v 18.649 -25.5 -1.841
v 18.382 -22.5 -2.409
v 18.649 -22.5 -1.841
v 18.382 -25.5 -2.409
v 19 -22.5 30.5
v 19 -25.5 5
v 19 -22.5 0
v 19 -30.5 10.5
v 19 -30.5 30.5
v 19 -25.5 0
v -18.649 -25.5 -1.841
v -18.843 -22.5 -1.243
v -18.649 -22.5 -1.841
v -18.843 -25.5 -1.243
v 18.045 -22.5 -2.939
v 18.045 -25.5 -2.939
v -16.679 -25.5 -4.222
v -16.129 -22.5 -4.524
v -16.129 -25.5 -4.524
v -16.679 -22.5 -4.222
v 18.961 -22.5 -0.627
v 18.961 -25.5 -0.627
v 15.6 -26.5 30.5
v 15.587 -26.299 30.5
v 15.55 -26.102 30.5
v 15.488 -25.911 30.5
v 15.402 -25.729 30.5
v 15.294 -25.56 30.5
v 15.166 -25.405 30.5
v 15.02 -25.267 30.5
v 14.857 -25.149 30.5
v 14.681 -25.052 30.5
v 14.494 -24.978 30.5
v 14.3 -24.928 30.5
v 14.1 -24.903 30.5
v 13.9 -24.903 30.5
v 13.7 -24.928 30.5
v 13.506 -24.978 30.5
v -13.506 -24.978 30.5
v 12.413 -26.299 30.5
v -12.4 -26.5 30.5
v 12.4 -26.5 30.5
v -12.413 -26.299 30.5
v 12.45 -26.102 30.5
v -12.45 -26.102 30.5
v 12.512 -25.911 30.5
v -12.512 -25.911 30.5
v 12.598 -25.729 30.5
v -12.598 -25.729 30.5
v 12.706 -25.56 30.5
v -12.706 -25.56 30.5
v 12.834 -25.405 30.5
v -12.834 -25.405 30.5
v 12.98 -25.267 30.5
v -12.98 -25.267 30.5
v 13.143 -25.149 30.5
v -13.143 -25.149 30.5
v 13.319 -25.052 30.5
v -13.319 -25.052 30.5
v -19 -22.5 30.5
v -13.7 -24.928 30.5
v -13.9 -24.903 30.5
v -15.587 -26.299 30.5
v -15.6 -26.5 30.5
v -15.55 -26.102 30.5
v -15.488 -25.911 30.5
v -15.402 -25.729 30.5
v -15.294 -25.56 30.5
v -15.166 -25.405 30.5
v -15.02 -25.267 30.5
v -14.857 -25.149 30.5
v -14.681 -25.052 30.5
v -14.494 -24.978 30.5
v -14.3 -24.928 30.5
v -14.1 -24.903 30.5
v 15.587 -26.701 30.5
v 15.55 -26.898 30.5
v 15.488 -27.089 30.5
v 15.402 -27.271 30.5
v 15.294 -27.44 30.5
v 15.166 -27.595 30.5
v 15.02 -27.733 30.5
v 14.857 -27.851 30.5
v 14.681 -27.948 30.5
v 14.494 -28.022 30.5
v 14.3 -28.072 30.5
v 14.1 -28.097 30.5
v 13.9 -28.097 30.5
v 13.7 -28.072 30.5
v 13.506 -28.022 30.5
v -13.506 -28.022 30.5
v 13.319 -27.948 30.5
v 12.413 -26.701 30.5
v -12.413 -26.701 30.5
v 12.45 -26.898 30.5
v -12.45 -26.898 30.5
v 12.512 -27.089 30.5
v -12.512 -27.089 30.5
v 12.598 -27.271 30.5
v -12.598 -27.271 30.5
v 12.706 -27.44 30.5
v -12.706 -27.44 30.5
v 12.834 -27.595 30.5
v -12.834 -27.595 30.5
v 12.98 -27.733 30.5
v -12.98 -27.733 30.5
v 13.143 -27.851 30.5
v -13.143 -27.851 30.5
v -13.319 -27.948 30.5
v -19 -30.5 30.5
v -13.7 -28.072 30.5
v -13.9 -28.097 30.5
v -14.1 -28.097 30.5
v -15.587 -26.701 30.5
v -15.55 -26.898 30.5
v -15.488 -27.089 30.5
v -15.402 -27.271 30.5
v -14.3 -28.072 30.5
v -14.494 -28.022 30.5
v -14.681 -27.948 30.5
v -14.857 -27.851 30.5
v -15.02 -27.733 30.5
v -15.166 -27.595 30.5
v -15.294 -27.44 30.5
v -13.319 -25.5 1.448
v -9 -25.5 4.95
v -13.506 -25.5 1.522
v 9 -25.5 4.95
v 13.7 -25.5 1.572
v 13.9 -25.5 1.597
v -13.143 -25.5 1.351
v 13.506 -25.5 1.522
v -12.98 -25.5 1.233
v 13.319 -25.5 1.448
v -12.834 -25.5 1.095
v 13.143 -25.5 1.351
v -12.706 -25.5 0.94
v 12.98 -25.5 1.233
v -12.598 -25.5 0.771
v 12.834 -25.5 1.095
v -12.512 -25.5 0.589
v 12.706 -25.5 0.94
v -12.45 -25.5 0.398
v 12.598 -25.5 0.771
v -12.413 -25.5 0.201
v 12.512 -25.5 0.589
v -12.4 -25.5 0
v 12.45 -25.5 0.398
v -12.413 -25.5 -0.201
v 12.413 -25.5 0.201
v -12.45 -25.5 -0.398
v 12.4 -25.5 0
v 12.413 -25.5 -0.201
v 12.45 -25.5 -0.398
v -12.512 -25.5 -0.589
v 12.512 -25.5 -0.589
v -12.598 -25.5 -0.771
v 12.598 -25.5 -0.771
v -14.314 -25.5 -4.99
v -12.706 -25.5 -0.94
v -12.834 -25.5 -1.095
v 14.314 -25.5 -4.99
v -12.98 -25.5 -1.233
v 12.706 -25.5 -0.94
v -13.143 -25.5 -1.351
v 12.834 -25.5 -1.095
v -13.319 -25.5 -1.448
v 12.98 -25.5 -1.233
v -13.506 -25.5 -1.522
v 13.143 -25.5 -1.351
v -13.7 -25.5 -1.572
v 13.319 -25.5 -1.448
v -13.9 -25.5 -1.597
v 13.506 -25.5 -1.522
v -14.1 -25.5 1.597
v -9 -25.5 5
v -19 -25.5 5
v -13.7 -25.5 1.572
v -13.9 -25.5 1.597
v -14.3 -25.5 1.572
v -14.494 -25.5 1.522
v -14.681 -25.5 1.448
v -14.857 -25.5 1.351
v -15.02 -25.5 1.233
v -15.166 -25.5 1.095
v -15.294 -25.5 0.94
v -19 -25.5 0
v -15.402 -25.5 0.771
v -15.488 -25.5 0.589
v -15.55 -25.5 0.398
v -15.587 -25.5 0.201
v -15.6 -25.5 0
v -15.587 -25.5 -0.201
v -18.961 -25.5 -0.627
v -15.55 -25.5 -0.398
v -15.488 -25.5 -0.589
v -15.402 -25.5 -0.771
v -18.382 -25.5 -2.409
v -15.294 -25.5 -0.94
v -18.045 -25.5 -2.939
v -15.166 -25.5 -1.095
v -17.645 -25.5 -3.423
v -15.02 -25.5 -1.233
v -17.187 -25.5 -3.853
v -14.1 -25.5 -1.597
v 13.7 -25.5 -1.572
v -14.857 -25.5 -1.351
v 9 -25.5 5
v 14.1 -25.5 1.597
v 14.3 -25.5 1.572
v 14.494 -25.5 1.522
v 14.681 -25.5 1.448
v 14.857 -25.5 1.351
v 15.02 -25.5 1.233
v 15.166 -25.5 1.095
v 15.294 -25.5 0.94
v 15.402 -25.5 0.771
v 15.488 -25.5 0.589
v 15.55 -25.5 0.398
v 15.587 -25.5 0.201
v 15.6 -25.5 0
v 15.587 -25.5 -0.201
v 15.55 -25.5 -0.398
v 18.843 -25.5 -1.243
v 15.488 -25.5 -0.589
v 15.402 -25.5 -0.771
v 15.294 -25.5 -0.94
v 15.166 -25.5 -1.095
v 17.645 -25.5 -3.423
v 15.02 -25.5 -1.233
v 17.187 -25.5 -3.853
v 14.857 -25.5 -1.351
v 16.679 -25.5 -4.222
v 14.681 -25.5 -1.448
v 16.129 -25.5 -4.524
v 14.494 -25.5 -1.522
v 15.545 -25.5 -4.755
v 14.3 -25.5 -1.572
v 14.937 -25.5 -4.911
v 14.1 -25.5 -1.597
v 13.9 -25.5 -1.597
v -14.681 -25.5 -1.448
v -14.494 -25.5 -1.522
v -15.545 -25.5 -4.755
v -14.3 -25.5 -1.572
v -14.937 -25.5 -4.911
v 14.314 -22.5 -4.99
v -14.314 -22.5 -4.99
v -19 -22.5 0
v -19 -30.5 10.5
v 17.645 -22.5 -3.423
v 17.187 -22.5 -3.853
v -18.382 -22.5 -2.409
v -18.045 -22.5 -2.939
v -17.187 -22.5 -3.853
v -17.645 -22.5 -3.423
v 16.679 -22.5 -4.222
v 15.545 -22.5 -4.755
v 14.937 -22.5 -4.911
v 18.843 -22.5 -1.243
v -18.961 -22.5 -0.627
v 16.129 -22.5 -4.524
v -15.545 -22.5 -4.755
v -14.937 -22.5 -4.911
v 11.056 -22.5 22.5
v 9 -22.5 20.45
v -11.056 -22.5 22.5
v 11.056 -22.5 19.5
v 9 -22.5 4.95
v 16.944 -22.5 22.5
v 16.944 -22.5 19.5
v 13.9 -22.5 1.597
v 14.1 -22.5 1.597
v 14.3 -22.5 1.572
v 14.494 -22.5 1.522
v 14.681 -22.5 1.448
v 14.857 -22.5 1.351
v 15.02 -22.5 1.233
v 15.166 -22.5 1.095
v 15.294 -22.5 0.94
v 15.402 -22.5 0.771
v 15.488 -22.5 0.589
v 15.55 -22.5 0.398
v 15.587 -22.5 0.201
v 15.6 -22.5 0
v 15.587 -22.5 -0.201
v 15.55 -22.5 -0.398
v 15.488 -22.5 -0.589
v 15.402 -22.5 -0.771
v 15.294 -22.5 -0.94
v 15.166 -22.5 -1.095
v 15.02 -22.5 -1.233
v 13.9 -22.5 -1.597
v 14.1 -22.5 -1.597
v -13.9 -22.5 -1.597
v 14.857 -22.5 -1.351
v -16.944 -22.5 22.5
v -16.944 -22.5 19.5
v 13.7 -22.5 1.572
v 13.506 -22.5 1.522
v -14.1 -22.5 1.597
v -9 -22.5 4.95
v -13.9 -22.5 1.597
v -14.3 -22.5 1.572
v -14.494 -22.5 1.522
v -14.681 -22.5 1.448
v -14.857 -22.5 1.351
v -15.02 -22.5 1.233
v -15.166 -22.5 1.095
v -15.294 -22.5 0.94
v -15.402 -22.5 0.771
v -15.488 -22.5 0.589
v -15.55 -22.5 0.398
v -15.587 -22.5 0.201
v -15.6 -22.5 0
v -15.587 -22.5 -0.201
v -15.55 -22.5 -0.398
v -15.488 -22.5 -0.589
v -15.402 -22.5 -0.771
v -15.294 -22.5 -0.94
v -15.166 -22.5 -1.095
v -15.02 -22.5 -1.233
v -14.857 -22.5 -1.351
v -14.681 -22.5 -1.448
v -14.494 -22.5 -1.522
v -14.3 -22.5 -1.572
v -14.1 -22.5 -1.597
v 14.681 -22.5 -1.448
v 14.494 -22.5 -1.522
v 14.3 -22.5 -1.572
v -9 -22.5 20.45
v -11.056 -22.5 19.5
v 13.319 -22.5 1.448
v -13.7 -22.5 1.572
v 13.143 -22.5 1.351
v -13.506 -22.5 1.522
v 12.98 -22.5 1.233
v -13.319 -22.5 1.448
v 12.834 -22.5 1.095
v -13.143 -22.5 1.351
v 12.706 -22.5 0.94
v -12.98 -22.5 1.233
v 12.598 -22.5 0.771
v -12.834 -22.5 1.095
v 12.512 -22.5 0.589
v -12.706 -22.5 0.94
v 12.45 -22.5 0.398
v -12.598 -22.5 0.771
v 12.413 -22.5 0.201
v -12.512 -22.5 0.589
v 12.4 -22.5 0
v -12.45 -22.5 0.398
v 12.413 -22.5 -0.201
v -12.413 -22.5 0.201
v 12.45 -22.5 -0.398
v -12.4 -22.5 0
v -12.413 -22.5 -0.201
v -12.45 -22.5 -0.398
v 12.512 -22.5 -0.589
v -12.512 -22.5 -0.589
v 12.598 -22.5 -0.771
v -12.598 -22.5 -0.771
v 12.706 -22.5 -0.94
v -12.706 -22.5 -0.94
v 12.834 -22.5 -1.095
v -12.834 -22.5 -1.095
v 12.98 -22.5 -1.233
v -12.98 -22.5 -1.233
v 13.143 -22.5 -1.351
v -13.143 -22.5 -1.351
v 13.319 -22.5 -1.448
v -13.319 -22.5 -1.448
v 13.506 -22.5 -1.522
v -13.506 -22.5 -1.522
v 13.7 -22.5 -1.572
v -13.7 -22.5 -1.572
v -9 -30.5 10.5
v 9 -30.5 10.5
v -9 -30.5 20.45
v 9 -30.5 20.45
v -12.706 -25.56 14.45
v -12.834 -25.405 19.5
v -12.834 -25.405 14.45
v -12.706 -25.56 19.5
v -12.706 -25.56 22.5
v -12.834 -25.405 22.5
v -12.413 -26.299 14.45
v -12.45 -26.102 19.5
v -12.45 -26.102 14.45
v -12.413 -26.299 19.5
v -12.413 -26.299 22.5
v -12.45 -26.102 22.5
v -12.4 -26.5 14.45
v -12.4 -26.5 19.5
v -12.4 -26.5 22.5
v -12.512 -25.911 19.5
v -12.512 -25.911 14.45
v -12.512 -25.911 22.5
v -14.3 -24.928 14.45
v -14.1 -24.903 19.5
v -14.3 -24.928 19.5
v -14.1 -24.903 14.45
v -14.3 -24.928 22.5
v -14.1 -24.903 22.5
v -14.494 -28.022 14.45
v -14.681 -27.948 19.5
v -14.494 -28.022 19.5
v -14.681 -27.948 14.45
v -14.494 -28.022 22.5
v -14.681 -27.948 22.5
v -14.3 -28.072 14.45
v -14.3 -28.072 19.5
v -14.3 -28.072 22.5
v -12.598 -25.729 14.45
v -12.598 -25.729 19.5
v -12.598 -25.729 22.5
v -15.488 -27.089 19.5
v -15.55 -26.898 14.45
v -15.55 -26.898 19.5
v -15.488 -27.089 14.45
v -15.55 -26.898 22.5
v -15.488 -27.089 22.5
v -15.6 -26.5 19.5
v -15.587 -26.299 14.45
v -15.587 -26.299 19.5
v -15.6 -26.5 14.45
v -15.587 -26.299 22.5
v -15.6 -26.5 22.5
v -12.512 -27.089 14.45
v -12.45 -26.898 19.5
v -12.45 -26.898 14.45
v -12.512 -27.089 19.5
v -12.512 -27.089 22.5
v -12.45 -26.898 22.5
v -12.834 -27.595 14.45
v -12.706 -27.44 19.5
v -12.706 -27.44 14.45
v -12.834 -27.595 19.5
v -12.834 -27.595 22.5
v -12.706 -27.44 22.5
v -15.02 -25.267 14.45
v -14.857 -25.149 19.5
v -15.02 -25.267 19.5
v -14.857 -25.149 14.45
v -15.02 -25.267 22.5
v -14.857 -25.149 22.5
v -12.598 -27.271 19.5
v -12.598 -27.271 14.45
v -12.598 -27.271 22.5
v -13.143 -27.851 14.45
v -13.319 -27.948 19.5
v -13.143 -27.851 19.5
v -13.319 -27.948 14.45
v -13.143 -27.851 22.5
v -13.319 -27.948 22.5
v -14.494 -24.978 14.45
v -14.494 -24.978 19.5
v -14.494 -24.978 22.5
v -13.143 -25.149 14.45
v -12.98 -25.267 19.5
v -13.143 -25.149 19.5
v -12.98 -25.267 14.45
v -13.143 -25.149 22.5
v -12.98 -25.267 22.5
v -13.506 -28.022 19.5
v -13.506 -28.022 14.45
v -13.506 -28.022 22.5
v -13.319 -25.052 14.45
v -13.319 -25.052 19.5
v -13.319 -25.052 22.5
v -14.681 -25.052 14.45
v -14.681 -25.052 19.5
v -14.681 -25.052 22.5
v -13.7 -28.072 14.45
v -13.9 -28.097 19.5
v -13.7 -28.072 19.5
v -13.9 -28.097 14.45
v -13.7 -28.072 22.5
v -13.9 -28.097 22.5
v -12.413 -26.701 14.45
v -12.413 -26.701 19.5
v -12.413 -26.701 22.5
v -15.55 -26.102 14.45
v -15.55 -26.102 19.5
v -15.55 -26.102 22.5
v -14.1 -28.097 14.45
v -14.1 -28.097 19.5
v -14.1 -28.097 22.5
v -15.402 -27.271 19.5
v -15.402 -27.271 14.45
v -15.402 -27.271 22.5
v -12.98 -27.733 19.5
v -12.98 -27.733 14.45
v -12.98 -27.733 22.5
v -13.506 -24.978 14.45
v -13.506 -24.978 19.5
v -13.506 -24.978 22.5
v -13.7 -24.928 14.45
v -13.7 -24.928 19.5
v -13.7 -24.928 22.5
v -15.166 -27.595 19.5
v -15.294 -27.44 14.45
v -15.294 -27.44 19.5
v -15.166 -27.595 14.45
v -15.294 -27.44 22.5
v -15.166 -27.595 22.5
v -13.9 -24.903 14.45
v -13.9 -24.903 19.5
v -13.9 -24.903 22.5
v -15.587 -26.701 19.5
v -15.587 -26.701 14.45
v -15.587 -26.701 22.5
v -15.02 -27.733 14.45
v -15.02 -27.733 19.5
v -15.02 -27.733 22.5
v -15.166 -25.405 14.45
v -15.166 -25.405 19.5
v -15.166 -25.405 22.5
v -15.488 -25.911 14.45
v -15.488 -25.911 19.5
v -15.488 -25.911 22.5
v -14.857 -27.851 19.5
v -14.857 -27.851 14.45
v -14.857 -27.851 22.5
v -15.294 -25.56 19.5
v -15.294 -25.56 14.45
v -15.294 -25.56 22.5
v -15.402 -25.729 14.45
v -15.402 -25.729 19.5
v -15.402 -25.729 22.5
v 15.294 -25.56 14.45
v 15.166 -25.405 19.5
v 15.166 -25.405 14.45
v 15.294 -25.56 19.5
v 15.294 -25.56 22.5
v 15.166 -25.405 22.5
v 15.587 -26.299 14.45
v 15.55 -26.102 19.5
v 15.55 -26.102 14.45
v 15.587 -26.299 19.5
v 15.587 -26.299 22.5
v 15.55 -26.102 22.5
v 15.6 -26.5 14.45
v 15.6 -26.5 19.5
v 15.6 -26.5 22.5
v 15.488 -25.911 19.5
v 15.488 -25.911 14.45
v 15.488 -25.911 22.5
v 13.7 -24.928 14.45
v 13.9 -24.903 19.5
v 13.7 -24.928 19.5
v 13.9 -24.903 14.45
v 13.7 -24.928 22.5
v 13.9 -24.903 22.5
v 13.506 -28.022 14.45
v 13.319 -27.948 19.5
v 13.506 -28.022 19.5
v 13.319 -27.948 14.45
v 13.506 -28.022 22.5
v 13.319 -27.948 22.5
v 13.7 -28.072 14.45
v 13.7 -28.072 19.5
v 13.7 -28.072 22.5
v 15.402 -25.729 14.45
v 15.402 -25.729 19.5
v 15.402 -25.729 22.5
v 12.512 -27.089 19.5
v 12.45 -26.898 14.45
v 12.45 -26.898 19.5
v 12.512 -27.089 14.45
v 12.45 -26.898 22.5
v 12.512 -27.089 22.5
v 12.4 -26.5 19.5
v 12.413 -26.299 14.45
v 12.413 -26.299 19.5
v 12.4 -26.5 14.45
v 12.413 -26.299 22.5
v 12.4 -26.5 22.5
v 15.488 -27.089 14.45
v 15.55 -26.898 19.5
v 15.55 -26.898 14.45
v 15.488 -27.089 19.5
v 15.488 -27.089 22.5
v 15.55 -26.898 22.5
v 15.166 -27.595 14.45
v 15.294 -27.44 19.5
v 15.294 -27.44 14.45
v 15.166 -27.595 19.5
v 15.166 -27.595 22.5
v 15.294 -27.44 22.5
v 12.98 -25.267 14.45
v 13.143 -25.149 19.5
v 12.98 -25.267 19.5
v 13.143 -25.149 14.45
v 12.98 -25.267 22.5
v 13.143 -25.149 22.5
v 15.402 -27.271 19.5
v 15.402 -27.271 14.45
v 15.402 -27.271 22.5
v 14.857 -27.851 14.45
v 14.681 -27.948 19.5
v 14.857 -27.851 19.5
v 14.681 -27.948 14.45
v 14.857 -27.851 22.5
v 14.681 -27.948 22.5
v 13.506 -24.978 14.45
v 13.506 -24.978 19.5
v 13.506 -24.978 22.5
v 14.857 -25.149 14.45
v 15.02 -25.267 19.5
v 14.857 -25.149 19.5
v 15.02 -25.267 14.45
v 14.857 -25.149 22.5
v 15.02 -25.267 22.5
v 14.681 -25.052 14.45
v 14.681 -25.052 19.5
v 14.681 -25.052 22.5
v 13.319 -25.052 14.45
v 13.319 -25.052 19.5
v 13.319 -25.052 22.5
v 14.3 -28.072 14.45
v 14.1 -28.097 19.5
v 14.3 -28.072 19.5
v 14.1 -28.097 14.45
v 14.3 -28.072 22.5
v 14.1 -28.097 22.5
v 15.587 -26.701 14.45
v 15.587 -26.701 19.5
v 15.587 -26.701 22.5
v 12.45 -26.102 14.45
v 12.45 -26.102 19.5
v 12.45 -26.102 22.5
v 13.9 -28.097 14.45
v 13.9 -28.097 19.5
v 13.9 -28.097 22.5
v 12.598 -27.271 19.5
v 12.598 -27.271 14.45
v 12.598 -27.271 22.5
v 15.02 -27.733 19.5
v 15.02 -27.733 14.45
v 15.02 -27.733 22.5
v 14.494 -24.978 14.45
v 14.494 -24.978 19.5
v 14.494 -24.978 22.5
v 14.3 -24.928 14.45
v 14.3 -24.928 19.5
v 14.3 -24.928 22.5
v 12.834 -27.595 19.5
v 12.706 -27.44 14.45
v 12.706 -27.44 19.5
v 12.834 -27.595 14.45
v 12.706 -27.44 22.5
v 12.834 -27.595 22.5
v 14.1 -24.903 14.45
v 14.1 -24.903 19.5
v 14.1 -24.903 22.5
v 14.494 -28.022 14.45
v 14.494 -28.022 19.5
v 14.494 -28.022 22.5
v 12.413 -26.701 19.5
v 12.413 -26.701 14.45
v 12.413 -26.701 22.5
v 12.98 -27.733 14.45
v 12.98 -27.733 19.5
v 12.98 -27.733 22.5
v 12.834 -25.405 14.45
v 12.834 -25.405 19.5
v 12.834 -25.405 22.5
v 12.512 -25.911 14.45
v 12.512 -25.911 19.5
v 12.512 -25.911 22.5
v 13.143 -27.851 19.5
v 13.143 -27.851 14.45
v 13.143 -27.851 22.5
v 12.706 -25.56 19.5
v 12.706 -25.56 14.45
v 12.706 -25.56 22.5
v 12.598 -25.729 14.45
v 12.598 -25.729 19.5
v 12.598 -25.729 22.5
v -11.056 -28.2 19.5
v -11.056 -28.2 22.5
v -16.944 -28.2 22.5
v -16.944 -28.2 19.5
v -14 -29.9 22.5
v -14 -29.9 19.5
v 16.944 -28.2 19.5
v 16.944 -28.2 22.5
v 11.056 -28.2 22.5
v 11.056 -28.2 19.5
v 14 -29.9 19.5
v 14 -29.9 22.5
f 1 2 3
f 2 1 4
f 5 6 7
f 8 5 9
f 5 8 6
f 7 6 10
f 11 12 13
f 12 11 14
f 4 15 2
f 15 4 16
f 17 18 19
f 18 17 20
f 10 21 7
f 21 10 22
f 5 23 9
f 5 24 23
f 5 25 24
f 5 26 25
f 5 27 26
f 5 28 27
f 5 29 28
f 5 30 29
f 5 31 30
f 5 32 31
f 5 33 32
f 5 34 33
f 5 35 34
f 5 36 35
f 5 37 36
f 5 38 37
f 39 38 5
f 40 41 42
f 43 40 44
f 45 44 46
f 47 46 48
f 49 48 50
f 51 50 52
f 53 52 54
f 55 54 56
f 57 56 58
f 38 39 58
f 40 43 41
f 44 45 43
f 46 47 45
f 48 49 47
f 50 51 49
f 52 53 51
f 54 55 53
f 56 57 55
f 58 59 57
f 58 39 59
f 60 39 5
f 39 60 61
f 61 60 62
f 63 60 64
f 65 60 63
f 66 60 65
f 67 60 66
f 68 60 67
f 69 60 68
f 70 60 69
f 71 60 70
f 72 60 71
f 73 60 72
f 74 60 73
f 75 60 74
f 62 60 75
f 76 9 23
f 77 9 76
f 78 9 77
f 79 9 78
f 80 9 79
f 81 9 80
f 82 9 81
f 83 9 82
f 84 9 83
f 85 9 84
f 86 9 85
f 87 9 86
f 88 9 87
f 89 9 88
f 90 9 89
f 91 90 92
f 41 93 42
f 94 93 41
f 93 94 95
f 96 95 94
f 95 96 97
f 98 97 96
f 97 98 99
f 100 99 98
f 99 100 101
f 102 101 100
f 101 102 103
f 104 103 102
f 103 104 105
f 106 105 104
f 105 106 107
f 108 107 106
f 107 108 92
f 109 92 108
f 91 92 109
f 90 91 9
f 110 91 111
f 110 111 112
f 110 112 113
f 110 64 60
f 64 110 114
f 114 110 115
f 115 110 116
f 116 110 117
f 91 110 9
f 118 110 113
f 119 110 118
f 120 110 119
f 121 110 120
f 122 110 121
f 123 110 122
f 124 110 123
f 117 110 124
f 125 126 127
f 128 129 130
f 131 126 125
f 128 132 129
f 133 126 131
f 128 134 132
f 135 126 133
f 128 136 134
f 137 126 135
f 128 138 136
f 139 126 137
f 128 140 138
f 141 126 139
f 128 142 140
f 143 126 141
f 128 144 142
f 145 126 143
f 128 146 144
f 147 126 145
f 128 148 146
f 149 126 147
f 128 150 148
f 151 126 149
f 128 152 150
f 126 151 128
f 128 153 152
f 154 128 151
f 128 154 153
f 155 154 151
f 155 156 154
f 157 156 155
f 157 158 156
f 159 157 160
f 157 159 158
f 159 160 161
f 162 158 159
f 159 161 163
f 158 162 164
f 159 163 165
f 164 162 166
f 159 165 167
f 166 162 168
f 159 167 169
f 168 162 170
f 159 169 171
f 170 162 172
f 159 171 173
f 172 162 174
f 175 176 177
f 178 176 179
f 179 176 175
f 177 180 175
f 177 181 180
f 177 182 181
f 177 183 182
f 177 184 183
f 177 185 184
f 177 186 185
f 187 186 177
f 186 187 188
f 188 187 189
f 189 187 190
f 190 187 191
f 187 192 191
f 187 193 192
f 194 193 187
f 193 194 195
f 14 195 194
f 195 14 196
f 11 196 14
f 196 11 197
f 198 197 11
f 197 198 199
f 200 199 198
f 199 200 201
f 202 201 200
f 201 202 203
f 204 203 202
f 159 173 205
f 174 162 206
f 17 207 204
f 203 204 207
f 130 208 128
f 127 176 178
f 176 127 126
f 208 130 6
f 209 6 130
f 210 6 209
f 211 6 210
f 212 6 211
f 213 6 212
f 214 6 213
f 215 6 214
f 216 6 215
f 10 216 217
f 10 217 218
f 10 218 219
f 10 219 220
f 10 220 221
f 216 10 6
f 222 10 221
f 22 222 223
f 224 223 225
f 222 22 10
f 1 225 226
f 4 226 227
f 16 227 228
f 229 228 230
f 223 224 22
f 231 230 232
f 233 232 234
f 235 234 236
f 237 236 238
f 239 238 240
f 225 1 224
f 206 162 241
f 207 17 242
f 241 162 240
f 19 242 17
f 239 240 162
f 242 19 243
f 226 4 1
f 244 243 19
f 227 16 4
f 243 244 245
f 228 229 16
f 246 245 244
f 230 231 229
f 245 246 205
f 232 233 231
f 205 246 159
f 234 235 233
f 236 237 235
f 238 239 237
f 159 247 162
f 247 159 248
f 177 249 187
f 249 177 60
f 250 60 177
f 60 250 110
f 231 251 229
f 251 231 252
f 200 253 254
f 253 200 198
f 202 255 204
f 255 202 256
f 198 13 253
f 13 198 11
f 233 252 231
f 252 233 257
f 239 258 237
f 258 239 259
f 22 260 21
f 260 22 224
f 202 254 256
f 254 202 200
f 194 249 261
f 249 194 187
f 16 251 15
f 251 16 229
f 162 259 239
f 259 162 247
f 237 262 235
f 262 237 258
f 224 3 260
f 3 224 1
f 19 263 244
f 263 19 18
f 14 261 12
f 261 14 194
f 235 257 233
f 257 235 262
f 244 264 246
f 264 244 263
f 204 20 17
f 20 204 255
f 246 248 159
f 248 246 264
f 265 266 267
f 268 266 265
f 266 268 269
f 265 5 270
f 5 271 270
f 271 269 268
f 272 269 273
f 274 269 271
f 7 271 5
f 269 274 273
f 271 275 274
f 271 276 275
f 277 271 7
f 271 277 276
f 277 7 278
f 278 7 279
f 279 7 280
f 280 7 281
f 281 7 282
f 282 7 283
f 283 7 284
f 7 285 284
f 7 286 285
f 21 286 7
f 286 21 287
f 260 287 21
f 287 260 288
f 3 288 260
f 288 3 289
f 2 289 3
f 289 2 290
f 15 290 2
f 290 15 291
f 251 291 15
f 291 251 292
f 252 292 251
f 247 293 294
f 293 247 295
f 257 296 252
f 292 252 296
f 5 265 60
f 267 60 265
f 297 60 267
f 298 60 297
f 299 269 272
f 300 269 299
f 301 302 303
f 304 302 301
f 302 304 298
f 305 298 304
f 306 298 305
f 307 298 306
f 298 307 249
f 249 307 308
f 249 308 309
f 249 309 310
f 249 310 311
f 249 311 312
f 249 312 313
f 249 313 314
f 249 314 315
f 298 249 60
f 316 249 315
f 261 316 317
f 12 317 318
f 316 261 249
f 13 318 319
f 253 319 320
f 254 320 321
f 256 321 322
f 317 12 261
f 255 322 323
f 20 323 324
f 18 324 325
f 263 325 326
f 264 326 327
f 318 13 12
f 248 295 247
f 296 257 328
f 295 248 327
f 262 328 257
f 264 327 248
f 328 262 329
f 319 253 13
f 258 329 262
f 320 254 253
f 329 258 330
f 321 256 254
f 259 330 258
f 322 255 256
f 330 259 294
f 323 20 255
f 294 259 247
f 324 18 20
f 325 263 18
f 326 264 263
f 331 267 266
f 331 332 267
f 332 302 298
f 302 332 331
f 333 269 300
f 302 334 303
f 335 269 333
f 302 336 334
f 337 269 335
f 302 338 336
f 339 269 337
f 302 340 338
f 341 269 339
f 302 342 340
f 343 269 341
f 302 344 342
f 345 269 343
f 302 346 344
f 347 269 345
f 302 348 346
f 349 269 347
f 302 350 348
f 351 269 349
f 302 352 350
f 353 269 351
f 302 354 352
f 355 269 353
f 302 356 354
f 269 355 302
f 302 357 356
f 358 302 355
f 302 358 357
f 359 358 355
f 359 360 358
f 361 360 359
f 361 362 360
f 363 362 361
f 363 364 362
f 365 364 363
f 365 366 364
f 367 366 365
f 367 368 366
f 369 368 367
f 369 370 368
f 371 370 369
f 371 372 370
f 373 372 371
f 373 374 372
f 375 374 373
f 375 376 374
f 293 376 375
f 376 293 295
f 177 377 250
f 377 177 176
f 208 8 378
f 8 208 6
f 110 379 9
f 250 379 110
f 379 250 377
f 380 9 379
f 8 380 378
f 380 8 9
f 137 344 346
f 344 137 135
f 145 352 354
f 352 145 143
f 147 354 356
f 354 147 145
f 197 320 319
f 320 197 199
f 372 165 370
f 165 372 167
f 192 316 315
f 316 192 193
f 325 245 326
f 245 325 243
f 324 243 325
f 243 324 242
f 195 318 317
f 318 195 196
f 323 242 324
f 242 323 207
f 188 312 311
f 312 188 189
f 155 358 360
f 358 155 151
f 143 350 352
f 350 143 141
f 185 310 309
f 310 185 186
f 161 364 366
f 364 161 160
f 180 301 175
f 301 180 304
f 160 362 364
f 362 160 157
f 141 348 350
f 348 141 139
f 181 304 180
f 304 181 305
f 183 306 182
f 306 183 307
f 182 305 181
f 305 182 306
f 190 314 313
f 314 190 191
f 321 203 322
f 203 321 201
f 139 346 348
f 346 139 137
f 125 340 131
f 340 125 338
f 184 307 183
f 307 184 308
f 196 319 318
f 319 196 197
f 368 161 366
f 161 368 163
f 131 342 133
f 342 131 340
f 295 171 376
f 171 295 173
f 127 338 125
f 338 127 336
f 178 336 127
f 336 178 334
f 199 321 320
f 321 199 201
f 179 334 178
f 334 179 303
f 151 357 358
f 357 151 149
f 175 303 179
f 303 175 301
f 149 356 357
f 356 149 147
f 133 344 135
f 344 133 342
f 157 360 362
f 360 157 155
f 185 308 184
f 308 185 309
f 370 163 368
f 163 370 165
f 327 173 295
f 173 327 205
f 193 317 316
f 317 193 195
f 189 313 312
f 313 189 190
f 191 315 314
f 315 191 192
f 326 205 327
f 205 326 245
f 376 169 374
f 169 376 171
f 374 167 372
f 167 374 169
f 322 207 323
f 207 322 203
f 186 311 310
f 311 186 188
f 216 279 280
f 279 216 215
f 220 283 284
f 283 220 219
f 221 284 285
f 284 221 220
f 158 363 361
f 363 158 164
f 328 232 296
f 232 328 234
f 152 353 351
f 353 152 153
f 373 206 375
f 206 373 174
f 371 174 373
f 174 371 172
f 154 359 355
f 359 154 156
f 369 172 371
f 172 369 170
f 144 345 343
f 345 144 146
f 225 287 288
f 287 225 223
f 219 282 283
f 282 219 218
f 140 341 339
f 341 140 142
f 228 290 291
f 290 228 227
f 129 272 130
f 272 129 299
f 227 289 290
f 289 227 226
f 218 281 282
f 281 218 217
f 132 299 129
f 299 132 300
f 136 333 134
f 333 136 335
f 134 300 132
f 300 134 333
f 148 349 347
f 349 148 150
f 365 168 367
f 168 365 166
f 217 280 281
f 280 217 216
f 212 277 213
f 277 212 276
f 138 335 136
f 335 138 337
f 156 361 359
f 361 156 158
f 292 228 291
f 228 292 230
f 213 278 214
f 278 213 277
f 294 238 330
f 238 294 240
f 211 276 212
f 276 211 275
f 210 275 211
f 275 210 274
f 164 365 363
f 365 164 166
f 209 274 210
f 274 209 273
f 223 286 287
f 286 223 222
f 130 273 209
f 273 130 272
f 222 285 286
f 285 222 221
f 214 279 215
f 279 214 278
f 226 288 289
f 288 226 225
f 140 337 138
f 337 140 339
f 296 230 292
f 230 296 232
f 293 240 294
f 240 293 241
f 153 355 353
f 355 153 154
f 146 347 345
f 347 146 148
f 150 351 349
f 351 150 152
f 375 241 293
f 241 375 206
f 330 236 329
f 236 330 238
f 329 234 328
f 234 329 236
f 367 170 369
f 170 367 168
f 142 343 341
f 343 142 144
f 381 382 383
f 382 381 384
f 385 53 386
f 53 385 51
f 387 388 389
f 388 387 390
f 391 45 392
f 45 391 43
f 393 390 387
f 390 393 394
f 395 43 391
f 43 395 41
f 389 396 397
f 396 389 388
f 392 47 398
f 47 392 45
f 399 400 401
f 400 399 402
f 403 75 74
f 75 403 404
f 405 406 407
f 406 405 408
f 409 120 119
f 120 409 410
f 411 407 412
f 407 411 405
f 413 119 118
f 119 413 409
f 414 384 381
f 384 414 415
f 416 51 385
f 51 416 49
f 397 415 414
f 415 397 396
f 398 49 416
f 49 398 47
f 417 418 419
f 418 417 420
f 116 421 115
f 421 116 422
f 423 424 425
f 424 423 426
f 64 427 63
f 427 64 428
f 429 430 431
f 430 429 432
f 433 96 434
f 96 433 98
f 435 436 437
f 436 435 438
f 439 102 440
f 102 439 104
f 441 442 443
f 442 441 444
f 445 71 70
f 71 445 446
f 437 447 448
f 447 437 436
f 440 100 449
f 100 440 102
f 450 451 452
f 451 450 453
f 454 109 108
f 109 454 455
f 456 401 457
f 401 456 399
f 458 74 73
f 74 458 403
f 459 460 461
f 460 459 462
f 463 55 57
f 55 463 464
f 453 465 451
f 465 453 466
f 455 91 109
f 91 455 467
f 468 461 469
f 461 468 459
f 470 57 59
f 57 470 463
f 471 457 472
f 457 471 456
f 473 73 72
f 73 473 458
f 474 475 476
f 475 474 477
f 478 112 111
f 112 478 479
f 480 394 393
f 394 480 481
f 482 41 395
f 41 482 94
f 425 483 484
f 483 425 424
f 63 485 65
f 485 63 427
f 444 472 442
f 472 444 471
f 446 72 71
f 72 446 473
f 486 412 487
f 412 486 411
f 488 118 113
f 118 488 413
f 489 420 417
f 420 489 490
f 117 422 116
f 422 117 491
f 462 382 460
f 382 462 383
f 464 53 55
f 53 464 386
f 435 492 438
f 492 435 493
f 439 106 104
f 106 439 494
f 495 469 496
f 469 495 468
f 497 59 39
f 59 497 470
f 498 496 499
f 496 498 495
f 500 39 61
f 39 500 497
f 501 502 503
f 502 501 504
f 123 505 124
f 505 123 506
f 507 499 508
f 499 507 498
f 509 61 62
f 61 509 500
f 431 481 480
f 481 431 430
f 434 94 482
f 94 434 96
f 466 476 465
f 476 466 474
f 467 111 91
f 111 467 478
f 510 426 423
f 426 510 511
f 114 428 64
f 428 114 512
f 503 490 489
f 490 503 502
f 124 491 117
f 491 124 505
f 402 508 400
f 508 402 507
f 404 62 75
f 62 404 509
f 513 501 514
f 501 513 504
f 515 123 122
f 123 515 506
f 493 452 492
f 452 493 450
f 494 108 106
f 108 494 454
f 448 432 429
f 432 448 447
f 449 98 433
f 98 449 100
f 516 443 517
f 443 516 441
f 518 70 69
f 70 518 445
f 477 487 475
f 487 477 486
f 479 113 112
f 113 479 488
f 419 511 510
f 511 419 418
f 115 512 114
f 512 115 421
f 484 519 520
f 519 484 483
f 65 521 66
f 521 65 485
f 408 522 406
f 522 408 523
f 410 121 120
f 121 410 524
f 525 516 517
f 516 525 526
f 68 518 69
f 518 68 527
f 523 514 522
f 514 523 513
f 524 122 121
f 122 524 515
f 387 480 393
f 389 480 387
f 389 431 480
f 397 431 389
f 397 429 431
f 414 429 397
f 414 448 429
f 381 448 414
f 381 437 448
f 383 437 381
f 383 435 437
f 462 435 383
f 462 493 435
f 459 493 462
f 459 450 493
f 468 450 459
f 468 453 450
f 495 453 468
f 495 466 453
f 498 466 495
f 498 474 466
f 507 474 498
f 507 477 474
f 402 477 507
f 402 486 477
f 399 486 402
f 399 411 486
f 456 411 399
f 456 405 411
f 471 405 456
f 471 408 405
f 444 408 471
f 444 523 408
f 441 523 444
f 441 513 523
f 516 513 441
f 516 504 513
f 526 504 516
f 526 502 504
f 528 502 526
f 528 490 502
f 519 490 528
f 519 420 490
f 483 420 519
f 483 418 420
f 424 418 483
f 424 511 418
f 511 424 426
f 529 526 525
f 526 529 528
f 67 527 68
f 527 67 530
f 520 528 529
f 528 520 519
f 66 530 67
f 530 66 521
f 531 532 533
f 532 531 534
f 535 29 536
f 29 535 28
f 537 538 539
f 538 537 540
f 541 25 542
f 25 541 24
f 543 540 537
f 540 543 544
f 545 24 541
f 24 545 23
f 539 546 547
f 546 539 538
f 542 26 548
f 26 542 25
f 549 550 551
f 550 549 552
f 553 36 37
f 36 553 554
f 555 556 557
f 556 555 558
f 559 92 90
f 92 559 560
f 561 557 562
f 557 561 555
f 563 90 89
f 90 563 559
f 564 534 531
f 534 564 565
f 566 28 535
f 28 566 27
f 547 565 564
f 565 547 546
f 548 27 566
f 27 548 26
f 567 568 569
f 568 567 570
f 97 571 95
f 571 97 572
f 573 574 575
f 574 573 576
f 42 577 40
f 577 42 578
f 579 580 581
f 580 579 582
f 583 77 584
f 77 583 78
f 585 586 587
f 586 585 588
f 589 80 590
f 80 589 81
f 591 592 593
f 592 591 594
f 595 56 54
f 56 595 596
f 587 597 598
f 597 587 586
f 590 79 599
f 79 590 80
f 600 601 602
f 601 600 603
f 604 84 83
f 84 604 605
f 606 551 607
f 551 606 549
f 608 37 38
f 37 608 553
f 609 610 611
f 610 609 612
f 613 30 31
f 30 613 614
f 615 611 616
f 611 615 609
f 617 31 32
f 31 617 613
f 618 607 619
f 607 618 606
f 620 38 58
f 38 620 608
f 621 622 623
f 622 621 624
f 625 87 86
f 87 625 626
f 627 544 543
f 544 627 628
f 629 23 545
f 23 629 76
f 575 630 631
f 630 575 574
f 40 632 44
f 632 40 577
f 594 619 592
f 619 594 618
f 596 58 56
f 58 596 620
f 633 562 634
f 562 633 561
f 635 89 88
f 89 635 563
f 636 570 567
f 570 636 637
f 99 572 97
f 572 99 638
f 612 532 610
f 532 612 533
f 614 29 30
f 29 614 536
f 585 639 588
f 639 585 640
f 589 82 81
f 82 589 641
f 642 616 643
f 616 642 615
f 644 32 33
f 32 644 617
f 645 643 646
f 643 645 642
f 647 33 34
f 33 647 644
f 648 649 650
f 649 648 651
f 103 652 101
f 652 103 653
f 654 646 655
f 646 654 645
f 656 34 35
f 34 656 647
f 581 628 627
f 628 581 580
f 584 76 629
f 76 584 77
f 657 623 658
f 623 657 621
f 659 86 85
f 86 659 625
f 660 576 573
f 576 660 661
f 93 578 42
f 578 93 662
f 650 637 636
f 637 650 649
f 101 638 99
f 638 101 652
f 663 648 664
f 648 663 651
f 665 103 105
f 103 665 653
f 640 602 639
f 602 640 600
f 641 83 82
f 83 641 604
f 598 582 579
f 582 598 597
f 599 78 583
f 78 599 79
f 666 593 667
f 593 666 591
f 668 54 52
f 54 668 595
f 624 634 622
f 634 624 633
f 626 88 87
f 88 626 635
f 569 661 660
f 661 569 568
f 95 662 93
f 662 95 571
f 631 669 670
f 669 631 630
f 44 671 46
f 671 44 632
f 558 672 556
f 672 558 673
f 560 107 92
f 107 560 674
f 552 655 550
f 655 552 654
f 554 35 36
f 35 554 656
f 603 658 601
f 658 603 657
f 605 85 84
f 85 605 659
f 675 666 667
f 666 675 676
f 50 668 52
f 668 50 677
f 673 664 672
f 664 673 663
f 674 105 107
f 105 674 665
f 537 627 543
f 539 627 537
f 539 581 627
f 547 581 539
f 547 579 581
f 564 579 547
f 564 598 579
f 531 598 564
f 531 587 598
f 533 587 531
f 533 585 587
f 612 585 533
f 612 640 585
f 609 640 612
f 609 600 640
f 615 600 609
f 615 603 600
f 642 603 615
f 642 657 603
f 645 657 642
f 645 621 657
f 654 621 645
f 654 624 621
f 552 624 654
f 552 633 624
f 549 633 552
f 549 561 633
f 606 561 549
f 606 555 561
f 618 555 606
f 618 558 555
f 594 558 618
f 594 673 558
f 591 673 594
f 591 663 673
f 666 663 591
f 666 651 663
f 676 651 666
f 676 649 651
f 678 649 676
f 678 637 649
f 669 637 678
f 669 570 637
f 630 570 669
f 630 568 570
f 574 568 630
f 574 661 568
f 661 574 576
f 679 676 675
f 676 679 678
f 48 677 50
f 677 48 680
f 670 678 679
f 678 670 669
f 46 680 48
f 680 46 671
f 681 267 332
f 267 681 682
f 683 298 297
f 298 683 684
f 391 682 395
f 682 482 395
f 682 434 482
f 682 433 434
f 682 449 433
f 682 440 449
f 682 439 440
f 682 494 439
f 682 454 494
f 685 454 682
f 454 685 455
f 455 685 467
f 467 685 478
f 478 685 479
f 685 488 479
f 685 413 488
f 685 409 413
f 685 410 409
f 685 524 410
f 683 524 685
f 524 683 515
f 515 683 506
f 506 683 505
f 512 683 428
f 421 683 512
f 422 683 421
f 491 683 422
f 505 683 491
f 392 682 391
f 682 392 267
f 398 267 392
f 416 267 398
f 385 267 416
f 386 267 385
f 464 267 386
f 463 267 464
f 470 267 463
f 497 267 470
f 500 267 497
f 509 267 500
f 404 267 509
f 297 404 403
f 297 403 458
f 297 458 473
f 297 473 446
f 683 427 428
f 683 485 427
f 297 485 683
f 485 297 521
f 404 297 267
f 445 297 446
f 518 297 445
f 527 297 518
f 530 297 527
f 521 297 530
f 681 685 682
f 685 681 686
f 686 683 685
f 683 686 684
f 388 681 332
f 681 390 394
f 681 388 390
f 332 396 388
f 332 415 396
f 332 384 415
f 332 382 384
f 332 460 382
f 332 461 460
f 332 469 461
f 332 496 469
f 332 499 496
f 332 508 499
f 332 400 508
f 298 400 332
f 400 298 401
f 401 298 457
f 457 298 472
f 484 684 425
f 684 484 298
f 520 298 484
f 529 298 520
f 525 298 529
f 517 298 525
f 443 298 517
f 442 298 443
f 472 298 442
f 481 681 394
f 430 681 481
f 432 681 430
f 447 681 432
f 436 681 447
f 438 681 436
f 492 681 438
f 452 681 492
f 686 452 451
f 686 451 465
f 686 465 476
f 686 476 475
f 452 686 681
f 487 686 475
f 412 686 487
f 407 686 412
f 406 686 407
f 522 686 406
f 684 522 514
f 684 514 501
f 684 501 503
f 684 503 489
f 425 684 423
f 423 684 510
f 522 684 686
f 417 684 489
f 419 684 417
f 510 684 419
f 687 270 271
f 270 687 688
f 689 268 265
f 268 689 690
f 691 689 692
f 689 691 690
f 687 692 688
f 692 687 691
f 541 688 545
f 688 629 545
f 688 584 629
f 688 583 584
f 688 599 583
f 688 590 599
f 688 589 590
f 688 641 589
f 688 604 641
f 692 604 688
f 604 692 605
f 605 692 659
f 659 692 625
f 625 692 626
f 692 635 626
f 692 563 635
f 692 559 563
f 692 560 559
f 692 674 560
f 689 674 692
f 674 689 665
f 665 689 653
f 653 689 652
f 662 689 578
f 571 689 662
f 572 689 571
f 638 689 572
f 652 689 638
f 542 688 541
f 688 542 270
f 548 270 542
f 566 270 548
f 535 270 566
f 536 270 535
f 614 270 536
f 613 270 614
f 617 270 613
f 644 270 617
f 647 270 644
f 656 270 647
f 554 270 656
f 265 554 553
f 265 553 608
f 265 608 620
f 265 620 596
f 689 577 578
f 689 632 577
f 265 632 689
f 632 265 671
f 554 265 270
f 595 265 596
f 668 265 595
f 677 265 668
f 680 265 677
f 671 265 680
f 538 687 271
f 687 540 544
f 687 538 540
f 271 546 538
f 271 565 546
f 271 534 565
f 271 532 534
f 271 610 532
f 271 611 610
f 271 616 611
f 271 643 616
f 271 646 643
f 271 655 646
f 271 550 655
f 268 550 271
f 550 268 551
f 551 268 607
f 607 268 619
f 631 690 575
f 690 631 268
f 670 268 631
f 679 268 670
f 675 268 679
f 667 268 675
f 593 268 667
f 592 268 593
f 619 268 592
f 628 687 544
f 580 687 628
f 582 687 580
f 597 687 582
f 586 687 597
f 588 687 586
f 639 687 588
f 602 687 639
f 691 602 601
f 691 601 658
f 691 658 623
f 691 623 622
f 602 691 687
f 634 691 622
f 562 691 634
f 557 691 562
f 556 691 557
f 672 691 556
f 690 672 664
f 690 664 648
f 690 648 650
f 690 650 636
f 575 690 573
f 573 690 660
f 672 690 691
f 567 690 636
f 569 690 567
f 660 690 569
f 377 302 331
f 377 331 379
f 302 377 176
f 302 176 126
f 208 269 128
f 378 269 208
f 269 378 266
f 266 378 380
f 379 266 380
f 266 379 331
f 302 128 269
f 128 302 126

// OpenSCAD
/********************************************************
This file is part of the RepRapPNP project, developed at the University of Hamburg.
Author: Daniel Ahlers <Danielahlers@googlemail.com> 
License: 'GNU Affero General Public License AGPLv3 http://www.gnu.org/licenses/agpl.html' 
*******************************************************/

// general object resolution
$fn = 50;

// camera visualization
//include <sanyo/HD2100P.scad>;
//%rotate([180,0,0]) HD2100P();
//%translate([0, 0, 2.5]) {
//    include <lens_adapter.scad>;
//}
//%rotate([0, 90, 0]) translate([-5, 0, 0])import("basler/Basler Lens 8mm C-Mount v02.stl");
//%translate([0,0,33+2.7]) rotate([180, 0, 0])  {
//    include <basler/lens_cover_ring.scad>;
//}



module camera_mount(t,r_h){
    translate([0,-45/2, 25.5]) {
        difference() {
            union(){
                hull() {
                    for(i=[-1, 1]) {
                        translate([i*(28/2), -t/2, -30.5+5]) rotate([90, 0, 0]) cylinder(r=5, h=t, center=true);
                        translate([i*(28/2), -t/2, 0]) rotate([90, 0, 0]) cube([10,10, t], center=true);
                    }
                }
                hull() {
                    translate([0, -t-(8-t)/2, -5]) cube([28+10,8-t,20], center=true);
                    translate([0,-t/2,-20]) cube([28+10,t,1], center=true);
                }
            }   
            translate([0, -t/2, -12.8]) rotate([90, 0, 0]) cube([18,15.5,t+30], center=true);
              for(i=[-1, 1]) {
                  translate([i*(28/2), 0, -30.5+5]) rotate([90, 0, 0]) cylinder(r=r_h, h=t*3, center=true);
              }
              for(i=[-1, 1]) {
                  translate([i*(28/2), -4, 5-8]) cylinder(r=r_h, h=16.1, center=true);
              }
              for(i=[-1, 1]) {
                  for(j=[0,2,t+2]) {
                  translate([i*(28/2), -4+j, 5-1.5-8]) rotate([0, 0, 90]) cylinder(r=3.4,h=3,$fn =6, center=true);
                  }
              }
        }
   }
}

camera_mount(3,1.6);
